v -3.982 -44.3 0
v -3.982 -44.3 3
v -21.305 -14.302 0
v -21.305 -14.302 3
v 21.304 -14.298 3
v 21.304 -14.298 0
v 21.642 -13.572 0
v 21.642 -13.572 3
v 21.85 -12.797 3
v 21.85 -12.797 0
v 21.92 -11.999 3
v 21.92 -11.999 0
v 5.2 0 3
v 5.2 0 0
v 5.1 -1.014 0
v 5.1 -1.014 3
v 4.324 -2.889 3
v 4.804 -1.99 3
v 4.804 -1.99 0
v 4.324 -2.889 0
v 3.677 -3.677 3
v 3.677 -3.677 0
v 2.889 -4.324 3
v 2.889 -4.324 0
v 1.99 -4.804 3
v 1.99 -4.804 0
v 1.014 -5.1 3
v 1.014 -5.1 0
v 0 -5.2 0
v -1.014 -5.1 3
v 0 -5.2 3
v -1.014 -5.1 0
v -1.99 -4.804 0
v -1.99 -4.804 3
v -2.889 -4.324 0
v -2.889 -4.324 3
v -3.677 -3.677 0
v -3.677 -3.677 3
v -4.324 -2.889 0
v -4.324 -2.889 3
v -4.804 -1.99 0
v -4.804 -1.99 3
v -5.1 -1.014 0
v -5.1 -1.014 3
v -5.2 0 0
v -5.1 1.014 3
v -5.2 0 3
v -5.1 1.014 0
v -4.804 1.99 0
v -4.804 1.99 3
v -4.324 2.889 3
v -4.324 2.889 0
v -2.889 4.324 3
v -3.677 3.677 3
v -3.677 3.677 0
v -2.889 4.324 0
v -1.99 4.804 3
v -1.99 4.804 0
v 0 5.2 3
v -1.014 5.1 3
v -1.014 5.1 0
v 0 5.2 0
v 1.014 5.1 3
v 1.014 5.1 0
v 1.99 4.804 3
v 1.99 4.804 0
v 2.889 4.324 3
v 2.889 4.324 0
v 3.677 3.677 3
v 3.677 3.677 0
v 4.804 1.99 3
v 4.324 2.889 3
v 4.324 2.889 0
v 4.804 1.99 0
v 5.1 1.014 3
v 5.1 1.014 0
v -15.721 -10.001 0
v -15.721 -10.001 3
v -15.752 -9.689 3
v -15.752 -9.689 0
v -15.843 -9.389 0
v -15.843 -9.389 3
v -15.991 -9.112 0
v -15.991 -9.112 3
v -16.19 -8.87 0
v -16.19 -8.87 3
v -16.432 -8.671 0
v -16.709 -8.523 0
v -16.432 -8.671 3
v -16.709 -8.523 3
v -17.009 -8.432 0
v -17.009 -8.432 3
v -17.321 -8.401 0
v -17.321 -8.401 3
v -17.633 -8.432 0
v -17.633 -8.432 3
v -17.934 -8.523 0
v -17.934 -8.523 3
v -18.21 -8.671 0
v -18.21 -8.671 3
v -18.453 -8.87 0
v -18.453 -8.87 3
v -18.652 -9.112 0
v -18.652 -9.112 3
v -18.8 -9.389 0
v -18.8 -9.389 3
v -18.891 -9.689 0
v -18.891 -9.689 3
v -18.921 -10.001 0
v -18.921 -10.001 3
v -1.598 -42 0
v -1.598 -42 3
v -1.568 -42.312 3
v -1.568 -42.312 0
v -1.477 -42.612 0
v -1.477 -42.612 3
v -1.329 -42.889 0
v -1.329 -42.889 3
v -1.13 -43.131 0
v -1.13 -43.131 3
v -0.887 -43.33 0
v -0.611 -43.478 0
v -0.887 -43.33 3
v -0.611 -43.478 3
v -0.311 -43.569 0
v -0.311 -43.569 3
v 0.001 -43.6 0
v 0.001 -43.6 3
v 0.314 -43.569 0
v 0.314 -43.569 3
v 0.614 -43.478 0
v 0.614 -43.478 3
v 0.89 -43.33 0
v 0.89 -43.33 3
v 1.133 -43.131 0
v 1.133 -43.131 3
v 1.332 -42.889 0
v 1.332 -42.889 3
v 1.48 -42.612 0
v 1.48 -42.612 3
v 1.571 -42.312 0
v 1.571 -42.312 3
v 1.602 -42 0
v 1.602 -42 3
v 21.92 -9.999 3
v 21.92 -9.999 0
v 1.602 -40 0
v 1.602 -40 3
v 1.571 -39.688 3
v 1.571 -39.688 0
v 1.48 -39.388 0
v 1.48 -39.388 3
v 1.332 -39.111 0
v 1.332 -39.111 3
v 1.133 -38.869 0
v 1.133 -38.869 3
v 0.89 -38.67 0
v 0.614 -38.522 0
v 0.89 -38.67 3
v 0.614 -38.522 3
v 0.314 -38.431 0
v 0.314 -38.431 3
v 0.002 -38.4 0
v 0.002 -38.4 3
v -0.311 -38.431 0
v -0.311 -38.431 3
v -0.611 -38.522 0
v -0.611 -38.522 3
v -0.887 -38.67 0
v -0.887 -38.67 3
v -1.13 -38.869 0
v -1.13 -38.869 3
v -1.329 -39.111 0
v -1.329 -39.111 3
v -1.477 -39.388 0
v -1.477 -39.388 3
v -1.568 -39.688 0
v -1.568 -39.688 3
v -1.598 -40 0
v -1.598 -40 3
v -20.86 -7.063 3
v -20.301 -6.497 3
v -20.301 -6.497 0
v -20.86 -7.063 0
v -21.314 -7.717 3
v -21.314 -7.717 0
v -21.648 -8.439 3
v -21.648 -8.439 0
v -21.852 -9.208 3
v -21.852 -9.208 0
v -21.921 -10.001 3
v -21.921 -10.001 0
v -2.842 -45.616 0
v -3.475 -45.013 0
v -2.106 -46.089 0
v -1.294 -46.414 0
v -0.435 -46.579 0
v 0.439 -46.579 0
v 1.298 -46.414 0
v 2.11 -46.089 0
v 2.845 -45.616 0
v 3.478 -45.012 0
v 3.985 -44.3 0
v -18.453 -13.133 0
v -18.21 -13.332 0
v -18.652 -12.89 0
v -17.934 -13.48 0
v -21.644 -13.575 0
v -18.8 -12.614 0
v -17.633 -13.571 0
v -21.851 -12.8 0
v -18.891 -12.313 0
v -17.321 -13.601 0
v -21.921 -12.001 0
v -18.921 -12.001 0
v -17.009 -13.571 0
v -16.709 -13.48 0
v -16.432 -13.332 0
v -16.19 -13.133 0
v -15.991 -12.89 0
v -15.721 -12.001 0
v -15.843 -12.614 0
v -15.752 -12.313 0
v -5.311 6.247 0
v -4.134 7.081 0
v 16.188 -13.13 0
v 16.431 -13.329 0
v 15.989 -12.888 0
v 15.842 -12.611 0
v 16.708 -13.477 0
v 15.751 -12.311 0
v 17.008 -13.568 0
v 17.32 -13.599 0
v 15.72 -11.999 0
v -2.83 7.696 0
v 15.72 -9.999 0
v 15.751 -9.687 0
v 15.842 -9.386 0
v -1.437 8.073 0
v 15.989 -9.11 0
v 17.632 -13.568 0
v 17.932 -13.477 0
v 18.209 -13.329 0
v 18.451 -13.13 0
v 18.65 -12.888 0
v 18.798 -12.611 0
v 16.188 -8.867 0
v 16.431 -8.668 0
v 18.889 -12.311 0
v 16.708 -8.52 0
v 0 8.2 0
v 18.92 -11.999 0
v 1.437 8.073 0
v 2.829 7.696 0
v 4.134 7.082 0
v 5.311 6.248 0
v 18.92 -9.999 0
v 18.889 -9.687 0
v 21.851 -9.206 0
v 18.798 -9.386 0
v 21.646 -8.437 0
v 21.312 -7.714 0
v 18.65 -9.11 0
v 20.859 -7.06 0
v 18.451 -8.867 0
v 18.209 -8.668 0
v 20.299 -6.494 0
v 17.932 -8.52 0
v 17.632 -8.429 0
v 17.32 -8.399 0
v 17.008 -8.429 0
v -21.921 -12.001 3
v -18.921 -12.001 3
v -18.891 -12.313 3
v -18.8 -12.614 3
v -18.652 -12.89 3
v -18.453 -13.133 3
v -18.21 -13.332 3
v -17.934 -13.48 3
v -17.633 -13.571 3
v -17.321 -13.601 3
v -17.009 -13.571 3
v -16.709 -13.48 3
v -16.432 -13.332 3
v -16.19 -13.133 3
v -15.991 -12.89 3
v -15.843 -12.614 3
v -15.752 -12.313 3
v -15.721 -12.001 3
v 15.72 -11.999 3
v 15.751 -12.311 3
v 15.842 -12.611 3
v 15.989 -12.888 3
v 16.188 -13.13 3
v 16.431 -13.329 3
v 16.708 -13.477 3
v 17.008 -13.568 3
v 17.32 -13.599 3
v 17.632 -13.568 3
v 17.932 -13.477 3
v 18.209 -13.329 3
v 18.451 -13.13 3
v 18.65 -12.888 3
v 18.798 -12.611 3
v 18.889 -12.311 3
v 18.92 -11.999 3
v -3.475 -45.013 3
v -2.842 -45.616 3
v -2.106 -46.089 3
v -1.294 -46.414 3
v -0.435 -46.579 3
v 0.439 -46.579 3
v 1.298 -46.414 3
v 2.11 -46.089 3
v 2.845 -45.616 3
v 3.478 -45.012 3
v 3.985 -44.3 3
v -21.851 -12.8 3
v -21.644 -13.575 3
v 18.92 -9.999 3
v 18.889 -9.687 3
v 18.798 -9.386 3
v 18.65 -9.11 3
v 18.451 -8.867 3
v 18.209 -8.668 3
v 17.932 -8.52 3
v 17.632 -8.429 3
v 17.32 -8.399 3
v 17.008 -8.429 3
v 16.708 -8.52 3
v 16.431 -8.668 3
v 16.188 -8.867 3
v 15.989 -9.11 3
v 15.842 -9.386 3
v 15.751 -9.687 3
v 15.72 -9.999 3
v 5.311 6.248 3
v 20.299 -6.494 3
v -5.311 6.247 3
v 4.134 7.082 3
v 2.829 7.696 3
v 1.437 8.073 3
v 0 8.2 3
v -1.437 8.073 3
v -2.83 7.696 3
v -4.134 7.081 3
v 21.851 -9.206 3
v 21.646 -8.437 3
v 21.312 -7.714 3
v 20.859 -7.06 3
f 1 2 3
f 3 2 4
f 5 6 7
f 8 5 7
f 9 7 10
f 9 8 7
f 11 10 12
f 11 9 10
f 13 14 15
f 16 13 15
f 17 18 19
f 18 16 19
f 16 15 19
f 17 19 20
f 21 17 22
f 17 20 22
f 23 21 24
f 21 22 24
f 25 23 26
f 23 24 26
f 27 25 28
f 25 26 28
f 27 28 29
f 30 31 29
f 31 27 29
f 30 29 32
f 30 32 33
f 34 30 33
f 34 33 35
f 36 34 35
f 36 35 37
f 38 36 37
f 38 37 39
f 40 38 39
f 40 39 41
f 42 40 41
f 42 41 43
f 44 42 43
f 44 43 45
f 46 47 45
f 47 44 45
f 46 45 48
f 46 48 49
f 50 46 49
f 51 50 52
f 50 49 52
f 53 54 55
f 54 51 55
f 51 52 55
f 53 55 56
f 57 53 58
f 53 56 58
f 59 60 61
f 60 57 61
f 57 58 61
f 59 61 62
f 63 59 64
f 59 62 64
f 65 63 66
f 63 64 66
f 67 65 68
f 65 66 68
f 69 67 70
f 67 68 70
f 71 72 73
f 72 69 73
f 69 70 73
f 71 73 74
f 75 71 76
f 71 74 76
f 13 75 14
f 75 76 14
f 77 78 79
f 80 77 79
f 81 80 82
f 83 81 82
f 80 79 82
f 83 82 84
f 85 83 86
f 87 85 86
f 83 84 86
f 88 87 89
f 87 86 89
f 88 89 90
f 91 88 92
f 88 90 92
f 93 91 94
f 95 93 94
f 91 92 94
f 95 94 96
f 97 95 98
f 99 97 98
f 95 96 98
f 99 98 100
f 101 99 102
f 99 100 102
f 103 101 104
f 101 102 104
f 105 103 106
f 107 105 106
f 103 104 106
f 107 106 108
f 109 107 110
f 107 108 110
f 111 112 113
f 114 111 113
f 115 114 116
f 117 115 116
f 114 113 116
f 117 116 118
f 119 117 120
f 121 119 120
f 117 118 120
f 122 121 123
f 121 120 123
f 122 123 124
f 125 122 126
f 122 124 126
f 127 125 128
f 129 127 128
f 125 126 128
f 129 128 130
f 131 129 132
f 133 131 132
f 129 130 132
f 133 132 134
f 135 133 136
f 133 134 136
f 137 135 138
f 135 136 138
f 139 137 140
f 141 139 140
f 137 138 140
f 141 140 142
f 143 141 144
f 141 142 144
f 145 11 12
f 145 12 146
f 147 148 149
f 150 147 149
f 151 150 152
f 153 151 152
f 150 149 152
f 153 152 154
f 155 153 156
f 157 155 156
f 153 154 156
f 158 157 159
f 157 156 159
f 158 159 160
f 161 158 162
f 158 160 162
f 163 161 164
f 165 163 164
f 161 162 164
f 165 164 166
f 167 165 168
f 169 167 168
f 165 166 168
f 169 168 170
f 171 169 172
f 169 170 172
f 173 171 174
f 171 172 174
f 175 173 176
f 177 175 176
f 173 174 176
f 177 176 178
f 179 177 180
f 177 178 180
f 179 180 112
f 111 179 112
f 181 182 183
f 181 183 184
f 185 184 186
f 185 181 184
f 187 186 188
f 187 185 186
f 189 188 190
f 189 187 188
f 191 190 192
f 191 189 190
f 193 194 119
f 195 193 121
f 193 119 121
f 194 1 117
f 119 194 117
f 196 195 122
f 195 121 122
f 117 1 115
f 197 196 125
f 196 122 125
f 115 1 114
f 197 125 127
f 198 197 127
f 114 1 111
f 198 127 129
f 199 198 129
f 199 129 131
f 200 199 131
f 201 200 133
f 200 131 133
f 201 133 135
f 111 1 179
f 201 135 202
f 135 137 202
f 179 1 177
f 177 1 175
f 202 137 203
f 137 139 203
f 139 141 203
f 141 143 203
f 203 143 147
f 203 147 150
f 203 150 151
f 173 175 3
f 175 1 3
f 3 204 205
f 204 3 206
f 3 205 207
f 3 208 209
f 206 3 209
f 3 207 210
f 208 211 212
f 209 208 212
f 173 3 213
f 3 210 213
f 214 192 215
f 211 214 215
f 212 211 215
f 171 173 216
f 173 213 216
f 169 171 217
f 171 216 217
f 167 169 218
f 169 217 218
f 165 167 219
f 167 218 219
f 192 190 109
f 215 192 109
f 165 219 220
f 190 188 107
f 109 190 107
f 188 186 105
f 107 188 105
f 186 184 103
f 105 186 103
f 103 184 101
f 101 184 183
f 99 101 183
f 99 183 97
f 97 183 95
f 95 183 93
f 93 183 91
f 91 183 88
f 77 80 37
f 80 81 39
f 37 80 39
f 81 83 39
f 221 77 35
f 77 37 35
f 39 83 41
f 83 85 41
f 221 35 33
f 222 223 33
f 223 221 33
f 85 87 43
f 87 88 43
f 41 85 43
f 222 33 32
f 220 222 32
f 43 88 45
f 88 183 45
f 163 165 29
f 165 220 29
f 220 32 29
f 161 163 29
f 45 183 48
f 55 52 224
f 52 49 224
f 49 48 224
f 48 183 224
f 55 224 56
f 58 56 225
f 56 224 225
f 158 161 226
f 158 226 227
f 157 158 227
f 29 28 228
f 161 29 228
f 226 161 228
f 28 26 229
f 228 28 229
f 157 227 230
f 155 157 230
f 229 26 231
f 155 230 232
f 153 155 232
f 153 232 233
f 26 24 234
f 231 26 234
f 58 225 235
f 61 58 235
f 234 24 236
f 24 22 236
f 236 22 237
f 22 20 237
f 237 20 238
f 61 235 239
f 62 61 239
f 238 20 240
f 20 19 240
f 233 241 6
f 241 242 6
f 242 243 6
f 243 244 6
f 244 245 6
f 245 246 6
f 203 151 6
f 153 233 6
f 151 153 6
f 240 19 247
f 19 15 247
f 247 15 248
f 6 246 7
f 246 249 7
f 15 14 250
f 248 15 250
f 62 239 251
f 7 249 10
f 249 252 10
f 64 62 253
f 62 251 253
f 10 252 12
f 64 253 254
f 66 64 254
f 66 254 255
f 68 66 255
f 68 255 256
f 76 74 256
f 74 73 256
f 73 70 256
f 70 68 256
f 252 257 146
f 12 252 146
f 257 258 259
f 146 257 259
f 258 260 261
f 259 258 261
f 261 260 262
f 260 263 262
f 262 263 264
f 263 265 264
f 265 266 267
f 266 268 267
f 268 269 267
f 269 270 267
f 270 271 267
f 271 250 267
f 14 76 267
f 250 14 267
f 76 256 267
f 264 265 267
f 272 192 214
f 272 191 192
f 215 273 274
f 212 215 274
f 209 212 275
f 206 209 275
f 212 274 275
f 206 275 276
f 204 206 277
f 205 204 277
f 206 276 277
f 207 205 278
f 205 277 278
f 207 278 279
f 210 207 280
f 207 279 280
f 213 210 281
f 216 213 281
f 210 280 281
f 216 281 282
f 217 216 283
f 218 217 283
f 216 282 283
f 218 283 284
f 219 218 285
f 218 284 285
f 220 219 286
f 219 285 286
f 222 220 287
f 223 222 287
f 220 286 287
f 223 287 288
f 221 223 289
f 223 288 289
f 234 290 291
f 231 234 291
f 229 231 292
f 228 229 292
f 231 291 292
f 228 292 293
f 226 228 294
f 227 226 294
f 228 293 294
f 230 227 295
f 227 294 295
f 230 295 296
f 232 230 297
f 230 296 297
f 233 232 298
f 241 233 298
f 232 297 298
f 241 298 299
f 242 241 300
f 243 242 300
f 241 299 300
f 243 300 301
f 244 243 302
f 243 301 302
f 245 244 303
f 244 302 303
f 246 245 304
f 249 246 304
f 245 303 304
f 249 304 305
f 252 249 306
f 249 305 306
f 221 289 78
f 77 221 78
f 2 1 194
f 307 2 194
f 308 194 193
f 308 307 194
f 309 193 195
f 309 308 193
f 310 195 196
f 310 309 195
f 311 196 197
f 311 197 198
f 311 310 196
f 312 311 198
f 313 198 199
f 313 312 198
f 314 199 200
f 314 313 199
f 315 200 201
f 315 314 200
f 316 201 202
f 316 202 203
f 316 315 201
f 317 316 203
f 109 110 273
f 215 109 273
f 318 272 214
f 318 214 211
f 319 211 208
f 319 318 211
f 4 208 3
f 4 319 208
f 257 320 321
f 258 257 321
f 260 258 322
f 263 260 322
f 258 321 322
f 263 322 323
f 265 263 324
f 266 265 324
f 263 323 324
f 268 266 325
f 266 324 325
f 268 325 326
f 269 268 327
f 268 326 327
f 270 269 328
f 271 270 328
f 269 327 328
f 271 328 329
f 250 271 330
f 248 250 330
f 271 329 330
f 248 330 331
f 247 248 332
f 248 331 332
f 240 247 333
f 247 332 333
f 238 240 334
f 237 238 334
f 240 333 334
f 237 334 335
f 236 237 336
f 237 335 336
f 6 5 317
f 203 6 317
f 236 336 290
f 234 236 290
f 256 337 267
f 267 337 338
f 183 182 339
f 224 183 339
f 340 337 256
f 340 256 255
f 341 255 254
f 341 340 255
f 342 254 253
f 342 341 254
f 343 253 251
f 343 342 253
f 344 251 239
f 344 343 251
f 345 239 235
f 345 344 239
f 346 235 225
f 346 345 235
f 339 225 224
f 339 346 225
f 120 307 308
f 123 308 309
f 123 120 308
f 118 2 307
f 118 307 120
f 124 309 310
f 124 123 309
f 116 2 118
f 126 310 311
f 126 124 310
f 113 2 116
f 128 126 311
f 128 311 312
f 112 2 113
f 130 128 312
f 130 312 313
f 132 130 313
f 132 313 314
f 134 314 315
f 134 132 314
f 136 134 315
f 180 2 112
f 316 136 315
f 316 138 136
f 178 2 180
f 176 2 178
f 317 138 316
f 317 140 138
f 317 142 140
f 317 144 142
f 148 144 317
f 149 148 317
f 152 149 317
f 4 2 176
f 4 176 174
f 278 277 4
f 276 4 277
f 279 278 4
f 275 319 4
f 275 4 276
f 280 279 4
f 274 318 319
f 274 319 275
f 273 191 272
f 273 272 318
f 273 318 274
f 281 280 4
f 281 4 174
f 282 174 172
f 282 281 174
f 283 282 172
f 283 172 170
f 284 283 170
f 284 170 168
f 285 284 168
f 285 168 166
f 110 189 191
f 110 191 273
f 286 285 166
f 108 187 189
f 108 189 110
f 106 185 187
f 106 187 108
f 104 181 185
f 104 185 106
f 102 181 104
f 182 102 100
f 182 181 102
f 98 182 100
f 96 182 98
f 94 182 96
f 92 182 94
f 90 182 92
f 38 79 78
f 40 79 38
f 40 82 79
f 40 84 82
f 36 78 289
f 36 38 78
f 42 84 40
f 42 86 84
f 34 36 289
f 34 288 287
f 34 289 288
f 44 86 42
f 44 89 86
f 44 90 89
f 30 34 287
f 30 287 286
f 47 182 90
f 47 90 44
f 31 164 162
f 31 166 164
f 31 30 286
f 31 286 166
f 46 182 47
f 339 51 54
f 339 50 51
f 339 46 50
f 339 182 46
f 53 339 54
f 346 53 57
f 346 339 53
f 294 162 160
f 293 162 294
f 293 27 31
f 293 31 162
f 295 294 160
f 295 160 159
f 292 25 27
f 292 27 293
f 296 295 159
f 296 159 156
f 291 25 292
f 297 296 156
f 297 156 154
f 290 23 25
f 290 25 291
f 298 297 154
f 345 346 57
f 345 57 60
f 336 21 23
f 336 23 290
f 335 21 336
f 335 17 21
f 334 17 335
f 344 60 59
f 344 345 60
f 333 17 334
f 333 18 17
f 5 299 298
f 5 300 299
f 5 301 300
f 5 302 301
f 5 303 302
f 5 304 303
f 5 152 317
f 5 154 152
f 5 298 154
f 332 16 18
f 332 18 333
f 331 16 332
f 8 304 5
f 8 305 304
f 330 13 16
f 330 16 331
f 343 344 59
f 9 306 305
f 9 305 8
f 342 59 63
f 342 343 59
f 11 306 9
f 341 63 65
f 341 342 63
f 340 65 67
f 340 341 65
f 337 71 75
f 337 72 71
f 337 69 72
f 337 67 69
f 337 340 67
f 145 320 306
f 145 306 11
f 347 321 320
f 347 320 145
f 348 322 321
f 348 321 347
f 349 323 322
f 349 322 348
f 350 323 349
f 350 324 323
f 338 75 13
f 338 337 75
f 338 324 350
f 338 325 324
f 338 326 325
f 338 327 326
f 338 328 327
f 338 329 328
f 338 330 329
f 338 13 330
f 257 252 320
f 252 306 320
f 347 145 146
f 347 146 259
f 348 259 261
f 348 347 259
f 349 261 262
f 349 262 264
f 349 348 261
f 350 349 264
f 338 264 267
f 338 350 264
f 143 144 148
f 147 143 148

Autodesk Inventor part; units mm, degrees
ref_plane "YZ Plane" through (0, 0, 0) normal (1, 0, 0) x (0, 1, 0)
ref_plane "XZ Plane" through (0, 0, 0) normal (0, 1, 0) x (-1, 0, 0)
ref_plane "XY Plane" through (0, 0, 0) normal (0, 0, 1) x (1, 0, 0)
sketch "スケッチ1" plane through (0, 0, 0) normal (0, 0, 1) x (1, 0, 0)
  circle A0 centre (0, 0) radius 5.2
  line L0 (25, -50) -> (-25, -50)
  line L1 (-25, -50) -> (-25, 50)
  line L2 (-25, 50) -> (25, 50)
  line L3 (25, 50) -> (25, -50)
  line L4 (25, -50) -> (-25, 50) construction
  line L5 (-25, -50) -> (25, 50) construction
  dimension "d0" = 10.4
  dimension "d1" = 50
  dimension "d2" = 100
extrude "押し出し1" add sketch "スケッチ1" along normal blind 3
sketch "スケッチ2" plane through (0, 0, 3) normal (0, 0, 1) x (1, 0, 0)
  circle A0 centre (17.3198, -9.9987) radius 1.25 construction
  circle A1 centre (-17.3213, -10.0013) radius 1.25 construction
  circle A2 centre (0.0015, -40) radius 1.25 construction
  line L0 (-17.3213, -10.0013) -> (-17.3213, -12.0013) construction
  line L1 (-18.9213, -10.0013) -> (-18.9213, -12.0013)
  line L2 (-15.7213, -12.0013) -> (-15.7213, -10.0013)
  arc A3 (-15.7213, -10.0013) -> (-18.9213, -10.0013) centre (-17.3213, -10.0013) ccw
  arc A4 (-18.9213, -12.0013) -> (-15.7213, -12.0013) centre (-17.3213, -12.0013) ccw
  line L3 (0.0015, -40) -> (0.0015, -42) construction
  line L4 (-1.5985, -40) -> (-1.5985, -42)
  line L5 (1.6015, -42) -> (1.6015, -40)
  arc A5 (1.6015, -40) -> (-1.5985, -40) centre (0.0015, -40) ccw
  arc A6 (-1.5985, -42) -> (1.6015, -42) centre (0.0015, -42) ccw
  line L6 (17.3198, -9.9987) -> (17.3198, -11.9987) construction
  line L7 (15.7198, -9.9987) -> (15.7198, -11.9987)
  line L8 (18.9198, -11.9987) -> (18.9198, -9.9987)
  arc A7 (18.9198, -9.9987) -> (15.7198, -9.9987) centre (17.3198, -9.9987) ccw
  arc A8 (15.7198, -11.9987) -> (18.9198, -11.9987) centre (17.3198, -11.9987) ccw
  circle A9 centre (0, 0) radius 5.2 projected
  arc A10 (5.3111, 6.2476) -> (-5.3114, 6.2473) centre (0, 0) ccw
  line L9 (-12.7213, -12.0013) -> (-12.7213, -10.0013)
  arc A11 (-20.3008, -6.4967) -> (-21.9213, -10.0013) centre (-17.3213, -10.0013) ccw
  line L10 (-21.9213, -10.0013) -> (-21.9213, -12.0013)
  arc A12 (-21.9213, -12.0013) -> (-21.3048, -14.3016) centre (-17.3213, -12.0013) ccw
  line L11 (21.9198, -11.9987) -> (21.9198, -9.9987)
  arc A13 (21.9198, -9.9987) -> (20.2992, -6.494) centre (17.3198, -9.9987) ccw
  line L12 (12.7198, -9.9987) -> (12.7198, -11.9987)
  arc A14 (21.3037, -14.2984) -> (21.9198, -11.9987) centre (17.3198, -11.9987) ccw
  line L13 (4.6015, -40) -> (4.6015, -42)
  arc A15 (-3.9821, -44.3003) -> (3.9854, -44.2997) centre (0.0015, -42) ccw
  line L14 (-4.5985, -42) -> (-4.5985, -40)
  arc A16 (4.6015, -40) -> (-4.5985, -40) centre (0.0015, -40) ccw
  line L15 (-20.3008, -6.4967) -> (-5.3114, 6.2473)
  line L16 (5.3111, 6.2476) -> (20.2992, -6.494)
  line L17 (21.3037, -14.2984) -> (3.9854, -44.2997)
  line L18 (-3.9821, -44.3003) -> (-21.3048, -14.3016)
  point P0 (-17.3213, -11.0013)
  point P1 (0.0015, -41)
  point P2 (17.3198, -10.9987)
  dimension "d5" = 1.6
  dimension "d6" = 2
  dimension "d7" = 3
  dimension "d8" = 3
  dimension "d9" = 3
  dimension "d10" = 3
extrude "押し出し2" cut sketch "スケッチ2" against normal blind 3 keep common part
properties part number "POTplate" material "アルミニウム 2014-T4"
